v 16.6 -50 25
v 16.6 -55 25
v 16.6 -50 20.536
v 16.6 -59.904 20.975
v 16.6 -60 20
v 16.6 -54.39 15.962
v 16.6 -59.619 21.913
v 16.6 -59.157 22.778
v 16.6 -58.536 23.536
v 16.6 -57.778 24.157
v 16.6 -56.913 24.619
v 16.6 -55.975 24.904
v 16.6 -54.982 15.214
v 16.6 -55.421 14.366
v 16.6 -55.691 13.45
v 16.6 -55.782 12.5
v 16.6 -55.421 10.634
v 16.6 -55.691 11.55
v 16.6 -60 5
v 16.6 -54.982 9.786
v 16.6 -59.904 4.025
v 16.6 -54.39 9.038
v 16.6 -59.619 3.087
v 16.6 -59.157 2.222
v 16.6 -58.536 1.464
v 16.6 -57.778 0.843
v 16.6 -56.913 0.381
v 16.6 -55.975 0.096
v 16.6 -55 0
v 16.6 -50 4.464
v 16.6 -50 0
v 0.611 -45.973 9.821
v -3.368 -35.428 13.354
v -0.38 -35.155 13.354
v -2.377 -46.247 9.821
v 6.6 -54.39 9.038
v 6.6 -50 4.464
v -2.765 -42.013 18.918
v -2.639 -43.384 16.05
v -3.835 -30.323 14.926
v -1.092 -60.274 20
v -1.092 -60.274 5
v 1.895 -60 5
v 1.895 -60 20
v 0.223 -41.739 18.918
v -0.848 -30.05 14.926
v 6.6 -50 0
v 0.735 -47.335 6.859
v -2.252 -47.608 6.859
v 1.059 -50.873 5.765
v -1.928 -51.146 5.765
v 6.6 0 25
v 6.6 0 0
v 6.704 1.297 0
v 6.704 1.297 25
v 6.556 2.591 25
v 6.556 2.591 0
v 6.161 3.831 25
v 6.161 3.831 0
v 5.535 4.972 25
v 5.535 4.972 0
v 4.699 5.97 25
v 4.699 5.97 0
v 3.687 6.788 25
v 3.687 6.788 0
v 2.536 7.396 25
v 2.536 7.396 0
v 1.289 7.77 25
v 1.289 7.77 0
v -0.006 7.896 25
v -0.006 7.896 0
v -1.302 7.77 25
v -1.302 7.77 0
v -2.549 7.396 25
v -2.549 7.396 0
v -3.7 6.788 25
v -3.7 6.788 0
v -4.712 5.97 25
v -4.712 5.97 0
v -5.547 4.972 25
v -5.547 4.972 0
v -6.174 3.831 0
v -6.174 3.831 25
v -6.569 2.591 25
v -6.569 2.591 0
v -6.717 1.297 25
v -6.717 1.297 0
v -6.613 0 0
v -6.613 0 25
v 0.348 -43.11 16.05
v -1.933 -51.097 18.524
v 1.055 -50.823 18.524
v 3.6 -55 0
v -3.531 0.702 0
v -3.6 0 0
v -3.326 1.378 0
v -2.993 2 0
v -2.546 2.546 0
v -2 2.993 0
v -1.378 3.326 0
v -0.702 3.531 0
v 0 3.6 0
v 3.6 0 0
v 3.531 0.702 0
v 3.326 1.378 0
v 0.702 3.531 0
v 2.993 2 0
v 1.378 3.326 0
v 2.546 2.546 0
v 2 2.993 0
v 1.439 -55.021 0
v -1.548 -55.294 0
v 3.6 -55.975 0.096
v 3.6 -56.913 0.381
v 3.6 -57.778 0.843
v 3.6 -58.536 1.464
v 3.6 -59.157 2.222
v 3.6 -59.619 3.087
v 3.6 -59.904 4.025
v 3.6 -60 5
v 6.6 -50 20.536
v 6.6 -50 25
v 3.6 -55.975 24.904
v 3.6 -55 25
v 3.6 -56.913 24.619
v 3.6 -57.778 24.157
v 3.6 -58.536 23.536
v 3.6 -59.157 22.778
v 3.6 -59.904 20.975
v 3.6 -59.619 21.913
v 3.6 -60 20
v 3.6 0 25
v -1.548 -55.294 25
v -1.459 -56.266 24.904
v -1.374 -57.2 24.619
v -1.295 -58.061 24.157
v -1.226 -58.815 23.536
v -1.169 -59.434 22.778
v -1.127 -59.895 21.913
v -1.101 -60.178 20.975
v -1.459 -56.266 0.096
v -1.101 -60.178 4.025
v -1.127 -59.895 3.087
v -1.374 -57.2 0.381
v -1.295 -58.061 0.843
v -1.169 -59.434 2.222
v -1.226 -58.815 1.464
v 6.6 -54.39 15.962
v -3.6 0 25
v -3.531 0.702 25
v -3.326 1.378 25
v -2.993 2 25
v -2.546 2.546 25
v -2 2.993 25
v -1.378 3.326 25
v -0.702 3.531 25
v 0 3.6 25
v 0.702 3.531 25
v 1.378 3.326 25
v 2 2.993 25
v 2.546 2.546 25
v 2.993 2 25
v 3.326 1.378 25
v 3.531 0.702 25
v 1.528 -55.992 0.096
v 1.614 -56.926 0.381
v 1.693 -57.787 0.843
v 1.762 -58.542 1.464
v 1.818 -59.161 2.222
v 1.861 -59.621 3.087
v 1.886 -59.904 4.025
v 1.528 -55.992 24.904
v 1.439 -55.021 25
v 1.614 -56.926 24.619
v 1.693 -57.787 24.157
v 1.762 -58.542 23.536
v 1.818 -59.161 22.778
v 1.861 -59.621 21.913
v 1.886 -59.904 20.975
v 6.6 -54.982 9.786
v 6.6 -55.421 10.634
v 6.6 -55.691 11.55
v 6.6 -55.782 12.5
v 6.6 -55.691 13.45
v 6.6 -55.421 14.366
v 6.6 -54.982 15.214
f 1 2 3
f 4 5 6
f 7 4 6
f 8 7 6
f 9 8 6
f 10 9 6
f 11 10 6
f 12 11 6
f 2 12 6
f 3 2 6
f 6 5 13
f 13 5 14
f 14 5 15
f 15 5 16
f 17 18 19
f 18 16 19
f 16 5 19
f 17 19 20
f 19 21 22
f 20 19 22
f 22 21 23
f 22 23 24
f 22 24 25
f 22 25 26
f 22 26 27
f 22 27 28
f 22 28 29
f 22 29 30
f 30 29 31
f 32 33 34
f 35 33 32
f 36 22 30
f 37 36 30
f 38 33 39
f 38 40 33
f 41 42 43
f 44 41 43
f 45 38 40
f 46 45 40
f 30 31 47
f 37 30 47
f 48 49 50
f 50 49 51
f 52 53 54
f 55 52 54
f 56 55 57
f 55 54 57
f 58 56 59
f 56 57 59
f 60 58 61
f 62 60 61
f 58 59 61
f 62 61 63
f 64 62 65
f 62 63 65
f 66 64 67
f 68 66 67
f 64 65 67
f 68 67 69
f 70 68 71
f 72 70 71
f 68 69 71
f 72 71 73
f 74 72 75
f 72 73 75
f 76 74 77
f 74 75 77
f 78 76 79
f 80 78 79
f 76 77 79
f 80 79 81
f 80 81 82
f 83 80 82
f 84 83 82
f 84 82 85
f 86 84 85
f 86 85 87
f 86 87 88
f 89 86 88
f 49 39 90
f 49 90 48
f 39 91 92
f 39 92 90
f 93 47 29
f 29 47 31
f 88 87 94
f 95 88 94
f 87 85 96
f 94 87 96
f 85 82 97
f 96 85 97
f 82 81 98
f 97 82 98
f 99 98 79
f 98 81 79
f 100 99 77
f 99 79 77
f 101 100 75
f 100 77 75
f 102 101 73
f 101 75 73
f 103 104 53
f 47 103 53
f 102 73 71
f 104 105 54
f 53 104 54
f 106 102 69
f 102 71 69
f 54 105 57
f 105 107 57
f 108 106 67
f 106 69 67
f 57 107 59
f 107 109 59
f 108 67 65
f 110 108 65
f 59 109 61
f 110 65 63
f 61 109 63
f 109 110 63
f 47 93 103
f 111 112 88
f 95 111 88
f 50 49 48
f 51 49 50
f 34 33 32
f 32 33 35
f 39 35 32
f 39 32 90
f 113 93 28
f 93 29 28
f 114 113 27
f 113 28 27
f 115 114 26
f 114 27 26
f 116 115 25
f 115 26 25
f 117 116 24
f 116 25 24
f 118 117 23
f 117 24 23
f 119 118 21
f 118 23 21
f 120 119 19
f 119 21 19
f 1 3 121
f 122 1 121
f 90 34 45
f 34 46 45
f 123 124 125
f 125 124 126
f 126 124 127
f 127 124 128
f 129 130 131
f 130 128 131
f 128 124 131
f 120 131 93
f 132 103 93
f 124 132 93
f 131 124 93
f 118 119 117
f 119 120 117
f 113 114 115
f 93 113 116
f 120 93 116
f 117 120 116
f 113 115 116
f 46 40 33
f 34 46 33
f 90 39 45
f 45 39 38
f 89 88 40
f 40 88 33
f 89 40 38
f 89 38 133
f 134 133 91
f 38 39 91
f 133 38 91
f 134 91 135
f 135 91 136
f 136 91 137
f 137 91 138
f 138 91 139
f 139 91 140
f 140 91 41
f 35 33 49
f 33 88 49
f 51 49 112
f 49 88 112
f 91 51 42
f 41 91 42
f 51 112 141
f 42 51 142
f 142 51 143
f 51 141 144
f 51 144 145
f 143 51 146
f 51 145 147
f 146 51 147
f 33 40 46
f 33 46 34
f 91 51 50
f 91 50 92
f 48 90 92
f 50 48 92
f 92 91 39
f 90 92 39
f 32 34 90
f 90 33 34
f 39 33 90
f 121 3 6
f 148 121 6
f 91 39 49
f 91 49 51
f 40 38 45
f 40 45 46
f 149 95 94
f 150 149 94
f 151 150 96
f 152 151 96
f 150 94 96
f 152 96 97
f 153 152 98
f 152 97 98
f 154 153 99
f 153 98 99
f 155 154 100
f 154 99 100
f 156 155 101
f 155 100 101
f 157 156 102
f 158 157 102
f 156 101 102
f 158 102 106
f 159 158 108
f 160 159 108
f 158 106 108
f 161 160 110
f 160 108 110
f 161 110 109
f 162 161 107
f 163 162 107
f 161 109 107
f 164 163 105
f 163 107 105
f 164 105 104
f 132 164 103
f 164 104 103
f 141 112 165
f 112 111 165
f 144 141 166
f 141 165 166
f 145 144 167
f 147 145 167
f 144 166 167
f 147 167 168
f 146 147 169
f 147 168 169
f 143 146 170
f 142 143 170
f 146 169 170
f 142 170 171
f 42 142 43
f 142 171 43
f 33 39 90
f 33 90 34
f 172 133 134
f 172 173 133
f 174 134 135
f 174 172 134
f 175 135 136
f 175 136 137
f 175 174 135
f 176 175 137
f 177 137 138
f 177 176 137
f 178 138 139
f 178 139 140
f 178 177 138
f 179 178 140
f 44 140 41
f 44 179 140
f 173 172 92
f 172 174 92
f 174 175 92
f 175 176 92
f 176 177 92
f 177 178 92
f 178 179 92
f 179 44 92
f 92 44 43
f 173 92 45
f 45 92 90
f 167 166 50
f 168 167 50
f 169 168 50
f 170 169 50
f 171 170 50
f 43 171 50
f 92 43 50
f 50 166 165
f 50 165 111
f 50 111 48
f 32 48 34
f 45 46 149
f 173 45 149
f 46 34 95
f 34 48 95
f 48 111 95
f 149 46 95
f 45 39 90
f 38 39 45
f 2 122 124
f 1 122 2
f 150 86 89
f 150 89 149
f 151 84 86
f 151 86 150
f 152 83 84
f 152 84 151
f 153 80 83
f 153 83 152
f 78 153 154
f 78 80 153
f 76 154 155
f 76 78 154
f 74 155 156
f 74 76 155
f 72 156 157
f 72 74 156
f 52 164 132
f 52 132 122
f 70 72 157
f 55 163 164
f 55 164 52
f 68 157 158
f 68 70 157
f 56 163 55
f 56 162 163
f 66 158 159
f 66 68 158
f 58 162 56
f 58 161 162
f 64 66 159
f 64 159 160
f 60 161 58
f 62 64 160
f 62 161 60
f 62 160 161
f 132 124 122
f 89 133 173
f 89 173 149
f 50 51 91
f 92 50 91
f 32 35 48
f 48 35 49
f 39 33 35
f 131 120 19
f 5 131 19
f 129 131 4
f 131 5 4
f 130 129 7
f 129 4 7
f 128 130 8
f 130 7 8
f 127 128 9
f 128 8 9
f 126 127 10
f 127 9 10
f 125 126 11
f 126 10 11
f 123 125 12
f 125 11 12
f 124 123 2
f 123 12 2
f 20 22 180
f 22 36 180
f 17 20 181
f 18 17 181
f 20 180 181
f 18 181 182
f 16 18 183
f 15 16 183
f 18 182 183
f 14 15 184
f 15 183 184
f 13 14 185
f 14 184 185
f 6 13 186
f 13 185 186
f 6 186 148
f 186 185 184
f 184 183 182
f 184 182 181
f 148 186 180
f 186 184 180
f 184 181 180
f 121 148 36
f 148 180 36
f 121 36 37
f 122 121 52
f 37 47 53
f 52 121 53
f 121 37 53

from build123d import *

# Parameters (mm, degrees)
F1_DEPTH  = 25
F4_DEPTH  = 10
F5_R      = 5
F6_R      = 5
F9_DEPTH  = 3
F11_DEPTH = 3
F12_DEPTH = 3
F13_DEPTH = 3
F15_DEPTH = 3
F16_DEPTH = 3


with BuildPart() as f1:
    # F0 (on Top) → F1 (new body)
    with BuildSketch(Plane.XY):
        with BuildLine():
            ThreePointArc((-3.6, 0), (0, 3.6), (3.6, 0))
            Line((3.6, 0), (3.6, -60))
            Line((3.6, -60), (6.6, -60))
            Line((6.6, -60), (16.6, -60))
            Line((16.6, -60), (16.6, -50))
            Line((16.6, -50), (6.6, -50))
            Line((6.6, -50), (6.6, -46.6112606227))
            Line((6.6, -46.6112606227), (6.6, 0))
            ThreePointArc((6.6, 0), (-0.0062780621, 7.8958150293), (-6.6125561241, 0))
            Line((-6.6125561241, 0), (-1.092247319, -60.2736172538))
            Line((-1.092247319, -60.2736172538), (1.8952488899, -60))
            Line((1.8952488899, -60), (-3.6, 0))
        make_face()
    extrude(amount=F1_DEPTH)

    # F3 (on offset) → F4 (cut)
    with BuildSketch(Plane.YZ.offset(16.6)):
        Polygon((-50, 4.4644676149), (-50, 20.5355323851), (-57.7130019665, 12.5), align=None)
    extrude(amount=-F4_DEPTH, mode=Mode.SUBTRACT)

    # F5
    f5_edges = [f1.edges().sort_by_distance(p)[0] for p in [
        (11.6, -57.713002, 12.5),
    ]]
    fillet(f5_edges, radius=F5_R)

    # F6
    f6_edges = [f1.edges().sort_by_distance(p)[0] for p in [
        (10.1, -60, 25),
        (0.401501, -60.136809, 25),
        (0.401501, -60.136809, 0),
        (10.1, -60, 0),
    ]]
    fillet(f6_edges, radius=F6_R)

    # F8 (on offset) → F9 (cut)
    with BuildSketch(Plane(origin=(-6.5575496483, -0.6005894571, 0), x_dir=(0.0912057513, -0.9958320696, 0), z_dir=(-0.9958320696, -0.0912057513, 0))):
        Polygon((50.7572274613, 5.7645259433), (50.7073389376, 18.5243248538), (42.9624207318, 16.050029546), (47.2042858601, 6.8593267351), align=None)
    extrude(amount=-F9_DEPTH, mode=Mode.SUBTRACT)

    # F10 (on offset) → F12 (cut)
    with BuildSketch(Plane(origin=(-6.5575496483, -0.6005894571, 0), x_dir=(0.0912057513, -0.9958320696, 0), z_dir=(-0.9958320696, -0.0912057513, 0))):
        Polygon((34.9735505879, 13.3536560461), (45.8372877534, 9.8211543656), (42.9624207318, 16.050029546), align=None)
    extrude(amount=-F12_DEPTH, mode=Mode.SUBTRACT)

    # F14 (on offset) → F15 (cut)
    with BuildSketch(Plane(origin=(-6.5575496483, -0.6005894571, 0), x_dir=(0.0912057513, -0.9958320696, 0), z_dir=(-0.9958320696, -0.0912057513, 0))):
        Polygon((34.9735505879, 13.3536560461), (42.9624207318, 16.050029546), (41.5855832398, 18.9179349691), (29.8472139984, 14.9256624281), align=None)
    extrude(amount=-F15_DEPTH, mode=Mode.SUBTRACT)


with BuildPart() as f11:
    # F8 (on offset) → F11 (new body)
    with BuildSketch(Plane(origin=(-6.5575496483, -0.6005894571, 0), x_dir=(0.0912057513, -0.9958320696, 0), z_dir=(-0.9958320696, -0.0912057513, 0))):
        Polygon((50.7572274613, 5.7645259433), (50.7073389376, 18.5243248538), (42.9624207318, 16.050029546), (47.2042858601, 6.8593267351), align=None)
    extrude(amount=-F11_DEPTH)


with BuildPart() as f13:
    # F10 (on offset) → F13 (new body)
    with BuildSketch(Plane(origin=(-6.5575496483, -0.6005894571, 0), x_dir=(0.0912057513, -0.9958320696, 0), z_dir=(-0.9958320696, -0.0912057513, 0))):
        Polygon((34.9735505879, 13.3536560461), (45.8372877534, 9.8211543656), (42.9624207318, 16.050029546), align=None)
    extrude(amount=-F13_DEPTH)


with BuildPart() as f16:
    # F14 (on offset) → F16 (new body)
    with BuildSketch(Plane(origin=(-6.5575496483, -0.6005894571, 0), x_dir=(0.0912057513, -0.9958320696, 0), z_dir=(-0.9958320696, -0.0912057513, 0))):
        Polygon((34.9735505879, 13.3536560461), (42.9624207318, 16.050029546), (41.5855832398, 18.9179349691), (29.8472139984, 14.9256624281), align=None)
    extrude(amount=-F16_DEPTH)


solid = Compound([f1.part, f11.part, f13.part, f16.part])
